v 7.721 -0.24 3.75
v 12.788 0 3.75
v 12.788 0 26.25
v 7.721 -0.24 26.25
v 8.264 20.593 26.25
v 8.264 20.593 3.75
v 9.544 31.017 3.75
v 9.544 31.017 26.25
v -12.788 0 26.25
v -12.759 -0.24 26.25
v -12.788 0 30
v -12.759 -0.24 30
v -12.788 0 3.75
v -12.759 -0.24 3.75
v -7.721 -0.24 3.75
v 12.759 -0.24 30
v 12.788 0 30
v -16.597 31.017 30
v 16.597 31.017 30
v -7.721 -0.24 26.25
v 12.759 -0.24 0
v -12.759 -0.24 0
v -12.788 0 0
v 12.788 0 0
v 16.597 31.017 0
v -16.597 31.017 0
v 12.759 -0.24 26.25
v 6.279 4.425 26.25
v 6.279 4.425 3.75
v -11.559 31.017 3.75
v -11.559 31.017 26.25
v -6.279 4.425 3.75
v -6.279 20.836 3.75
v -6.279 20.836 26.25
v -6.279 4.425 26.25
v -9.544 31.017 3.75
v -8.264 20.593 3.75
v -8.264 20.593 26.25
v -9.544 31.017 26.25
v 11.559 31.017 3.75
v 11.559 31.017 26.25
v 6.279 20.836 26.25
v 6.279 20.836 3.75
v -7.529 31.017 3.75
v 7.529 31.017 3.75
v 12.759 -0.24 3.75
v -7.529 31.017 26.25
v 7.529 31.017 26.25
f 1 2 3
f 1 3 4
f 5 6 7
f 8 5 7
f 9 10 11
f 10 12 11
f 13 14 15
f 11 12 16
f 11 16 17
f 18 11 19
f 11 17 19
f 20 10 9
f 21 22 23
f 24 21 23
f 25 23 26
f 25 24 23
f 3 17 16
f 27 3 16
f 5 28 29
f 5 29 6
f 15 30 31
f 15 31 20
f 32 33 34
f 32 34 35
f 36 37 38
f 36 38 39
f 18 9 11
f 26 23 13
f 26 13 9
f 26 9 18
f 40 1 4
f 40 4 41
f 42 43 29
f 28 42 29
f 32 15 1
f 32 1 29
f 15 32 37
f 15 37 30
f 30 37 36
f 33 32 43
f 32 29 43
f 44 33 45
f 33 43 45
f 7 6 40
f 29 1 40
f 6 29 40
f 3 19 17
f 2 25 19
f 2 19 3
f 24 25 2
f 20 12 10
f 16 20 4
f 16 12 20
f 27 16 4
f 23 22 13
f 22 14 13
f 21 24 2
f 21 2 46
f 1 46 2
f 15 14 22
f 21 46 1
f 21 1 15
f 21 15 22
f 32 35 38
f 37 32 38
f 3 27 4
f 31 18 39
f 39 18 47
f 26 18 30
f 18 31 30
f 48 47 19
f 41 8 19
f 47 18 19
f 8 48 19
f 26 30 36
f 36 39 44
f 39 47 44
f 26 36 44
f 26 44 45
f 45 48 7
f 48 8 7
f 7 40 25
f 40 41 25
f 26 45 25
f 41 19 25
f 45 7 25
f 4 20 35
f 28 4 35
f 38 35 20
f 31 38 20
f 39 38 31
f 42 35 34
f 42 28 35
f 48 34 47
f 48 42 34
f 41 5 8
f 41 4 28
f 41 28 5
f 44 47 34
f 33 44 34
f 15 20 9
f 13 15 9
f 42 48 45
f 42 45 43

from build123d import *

# Parameters (mm, degrees)
SALIENTE_EXTRUIR1_DEPTH             = 30
SALIENTE_EXTRUIR1_2_DEPTH           = 30
SALIENTE_EXTRUIR1_3_DEPTH           = 30
SALIENTE_EXTRUIR1_4_DEPTH           = 30
SALIENTE_EXTRUIR3_REACH             = 48.233
CROQUIS3_W                          = 3.75
CROQUIS3_H                          = 31.257280714
SALIENTE_EXTRUIR3_DIRECTION_2_REACH = 48.233


with BuildPart() as part:
    # Croquis1 → Saliente-Extruir1 (new body)
    with BuildSketch(Plane.XY):
        Polygon((11.559312896, 31.017067239), (16.596862024, 31.017067239), (12.788445042, 0), (7.721401409, -0.240213475), align=None)
    extrude(amount=SALIENTE_EXTRUIR1_DEPTH)



with BuildPart() as body_2:
    # Croquis1 → Saliente-Extruir1 2 (new body)
    with BuildSketch(Plane.XY):
        Polygon((-7.529273594, 31.017067239), (-6.279253351, 20.836469336), (-6.279253351, 4.425451239), (-8.264345654, 20.592730649), (-9.544293245, 31.017067239), align=None)
    extrude(amount=SALIENTE_EXTRUIR1_2_DEPTH)


with BuildPart() as body_3:
    # Croquis1 → Saliente-Extruir1 3 (new body)
    with BuildSketch(Plane.XY):
        Polygon((-11.559312896, 31.017067239), (-7.721401409, -0.240213475), (-12.788445042, 0), (-16.596862024, 31.017067239), align=None)
    extrude(amount=SALIENTE_EXTRUIR1_3_DEPTH)


with BuildPart() as body_4:
    # Croquis1 → Saliente-Extruir1 4 (new body)
    with BuildSketch(Plane.XY):
        Polygon((7.529273594, 31.017067239), (6.279253351, 20.836469336), (6.279253351, 4.425451239), (8.264345654, 20.592730649), (9.544293245, 31.017067239), align=None)
    extrude(amount=SALIENTE_EXTRUIR1_4_DEPTH)


with BuildPart() as part_1:
    add(part.part)

    add(body_2.part)  # Saliente-Extruir3 merges body 2

    add(body_4.part)  # Saliente-Extruir3 merges body 4

    add(body_3.part)  # Saliente-Extruir3 merges body 3
    # Saliente-Extruir3: up to this plane
    saliente_extruir3_end = Plane(origin=(16.596862024, 31.017067239, 30), z_dir=(-0.992546151641322, 0.12186934340514874, 0))
    # Croquis3 → Saliente-Extruir3 (add, up to the surface)
    with BuildSketch(Plane(origin=(0, 0, 0), x_dir=(0, 0, -1), z_dir=(1, 0, 0)), mode=Mode.PRIVATE) as saliente_extruir3_sk1:
        with Locations((-28.125, 15.388426882)):
            Rectangle(CROQUIS3_W, CROQUIS3_H)
    saliente_extruir3_tool1 = split(extrude(saliente_extruir3_sk1.sketch, amount=SALIENTE_EXTRUIR3_REACH, mode=Mode.PRIVATE), bisect_by=saliente_extruir3_end, keep=Keep.BOTH, mode=Mode.PRIVATE)
    add(saliente_extruir3_tool1.solids().sort_by_distance((0, 15.388427, 28.125))[0])
    # Croquis3 → Saliente-Extruir3 (add, up to the surface)
    with BuildSketch(Plane(origin=(0, 0, 0), x_dir=(0, 0, -1), z_dir=(1, 0, 0)), mode=Mode.PRIVATE) as saliente_extruir3_sk2:
        with Locations((-1.875, 15.388426882)):
            Rectangle(CROQUIS3_W, CROQUIS3_H)
    saliente_extruir3_tool2 = split(extrude(saliente_extruir3_sk2.sketch, amount=SALIENTE_EXTRUIR3_REACH, mode=Mode.PRIVATE), bisect_by=saliente_extruir3_end, keep=Keep.BOTH, mode=Mode.PRIVATE)
    add(saliente_extruir3_tool2.solids().sort_by_distance((0, 15.388427, 1.875))[0])

    # Saliente-Extruir3 direction 2: up to this plane
    saliente_extruir3_direction_2_end = Plane(origin=(-16.596862024, 31.017067239, 30), z_dir=(0.992546151641322, 0.12186934340514874, 0))
    # Croquis3 → Saliente-Extruir3 direction 2 (add, up to the surface)
    with BuildSketch(Plane(origin=(0, 0, 0), x_dir=(0, 0, -1), z_dir=(1, 0, 0)), mode=Mode.PRIVATE) as saliente_extruir3_direction_2_sk1:
        with Locations((-28.125, 15.388426882)):
            Rectangle(CROQUIS3_W, CROQUIS3_H)
    saliente_extruir3_direction_2_tool1 = split(extrude(saliente_extruir3_direction_2_sk1.sketch, amount=-SALIENTE_EXTRUIR3_DIRECTION_2_REACH, mode=Mode.PRIVATE), bisect_by=saliente_extruir3_direction_2_end, keep=Keep.BOTH, mode=Mode.PRIVATE)
    add(saliente_extruir3_direction_2_tool1.solids().sort_by_distance((0, 15.388427, 28.125))[0])
    # Croquis3 → Saliente-Extruir3 direction 2 (add, up to the surface)
    with BuildSketch(Plane(origin=(0, 0, 0), x_dir=(0, 0, -1), z_dir=(1, 0, 0)), mode=Mode.PRIVATE) as saliente_extruir3_direction_2_sk2:
        with Locations((-1.875, 15.388426882)):
            Rectangle(CROQUIS3_W, CROQUIS3_H)
    saliente_extruir3_direction_2_tool2 = split(extrude(saliente_extruir3_direction_2_sk2.sketch, amount=-SALIENTE_EXTRUIR3_DIRECTION_2_REACH, mode=Mode.PRIVATE), bisect_by=saliente_extruir3_direction_2_end, keep=Keep.BOTH, mode=Mode.PRIVATE)
    add(saliente_extruir3_direction_2_tool2.solids().sort_by_distance((0, 15.388427, 1.875))[0])


solid = part_1.part
